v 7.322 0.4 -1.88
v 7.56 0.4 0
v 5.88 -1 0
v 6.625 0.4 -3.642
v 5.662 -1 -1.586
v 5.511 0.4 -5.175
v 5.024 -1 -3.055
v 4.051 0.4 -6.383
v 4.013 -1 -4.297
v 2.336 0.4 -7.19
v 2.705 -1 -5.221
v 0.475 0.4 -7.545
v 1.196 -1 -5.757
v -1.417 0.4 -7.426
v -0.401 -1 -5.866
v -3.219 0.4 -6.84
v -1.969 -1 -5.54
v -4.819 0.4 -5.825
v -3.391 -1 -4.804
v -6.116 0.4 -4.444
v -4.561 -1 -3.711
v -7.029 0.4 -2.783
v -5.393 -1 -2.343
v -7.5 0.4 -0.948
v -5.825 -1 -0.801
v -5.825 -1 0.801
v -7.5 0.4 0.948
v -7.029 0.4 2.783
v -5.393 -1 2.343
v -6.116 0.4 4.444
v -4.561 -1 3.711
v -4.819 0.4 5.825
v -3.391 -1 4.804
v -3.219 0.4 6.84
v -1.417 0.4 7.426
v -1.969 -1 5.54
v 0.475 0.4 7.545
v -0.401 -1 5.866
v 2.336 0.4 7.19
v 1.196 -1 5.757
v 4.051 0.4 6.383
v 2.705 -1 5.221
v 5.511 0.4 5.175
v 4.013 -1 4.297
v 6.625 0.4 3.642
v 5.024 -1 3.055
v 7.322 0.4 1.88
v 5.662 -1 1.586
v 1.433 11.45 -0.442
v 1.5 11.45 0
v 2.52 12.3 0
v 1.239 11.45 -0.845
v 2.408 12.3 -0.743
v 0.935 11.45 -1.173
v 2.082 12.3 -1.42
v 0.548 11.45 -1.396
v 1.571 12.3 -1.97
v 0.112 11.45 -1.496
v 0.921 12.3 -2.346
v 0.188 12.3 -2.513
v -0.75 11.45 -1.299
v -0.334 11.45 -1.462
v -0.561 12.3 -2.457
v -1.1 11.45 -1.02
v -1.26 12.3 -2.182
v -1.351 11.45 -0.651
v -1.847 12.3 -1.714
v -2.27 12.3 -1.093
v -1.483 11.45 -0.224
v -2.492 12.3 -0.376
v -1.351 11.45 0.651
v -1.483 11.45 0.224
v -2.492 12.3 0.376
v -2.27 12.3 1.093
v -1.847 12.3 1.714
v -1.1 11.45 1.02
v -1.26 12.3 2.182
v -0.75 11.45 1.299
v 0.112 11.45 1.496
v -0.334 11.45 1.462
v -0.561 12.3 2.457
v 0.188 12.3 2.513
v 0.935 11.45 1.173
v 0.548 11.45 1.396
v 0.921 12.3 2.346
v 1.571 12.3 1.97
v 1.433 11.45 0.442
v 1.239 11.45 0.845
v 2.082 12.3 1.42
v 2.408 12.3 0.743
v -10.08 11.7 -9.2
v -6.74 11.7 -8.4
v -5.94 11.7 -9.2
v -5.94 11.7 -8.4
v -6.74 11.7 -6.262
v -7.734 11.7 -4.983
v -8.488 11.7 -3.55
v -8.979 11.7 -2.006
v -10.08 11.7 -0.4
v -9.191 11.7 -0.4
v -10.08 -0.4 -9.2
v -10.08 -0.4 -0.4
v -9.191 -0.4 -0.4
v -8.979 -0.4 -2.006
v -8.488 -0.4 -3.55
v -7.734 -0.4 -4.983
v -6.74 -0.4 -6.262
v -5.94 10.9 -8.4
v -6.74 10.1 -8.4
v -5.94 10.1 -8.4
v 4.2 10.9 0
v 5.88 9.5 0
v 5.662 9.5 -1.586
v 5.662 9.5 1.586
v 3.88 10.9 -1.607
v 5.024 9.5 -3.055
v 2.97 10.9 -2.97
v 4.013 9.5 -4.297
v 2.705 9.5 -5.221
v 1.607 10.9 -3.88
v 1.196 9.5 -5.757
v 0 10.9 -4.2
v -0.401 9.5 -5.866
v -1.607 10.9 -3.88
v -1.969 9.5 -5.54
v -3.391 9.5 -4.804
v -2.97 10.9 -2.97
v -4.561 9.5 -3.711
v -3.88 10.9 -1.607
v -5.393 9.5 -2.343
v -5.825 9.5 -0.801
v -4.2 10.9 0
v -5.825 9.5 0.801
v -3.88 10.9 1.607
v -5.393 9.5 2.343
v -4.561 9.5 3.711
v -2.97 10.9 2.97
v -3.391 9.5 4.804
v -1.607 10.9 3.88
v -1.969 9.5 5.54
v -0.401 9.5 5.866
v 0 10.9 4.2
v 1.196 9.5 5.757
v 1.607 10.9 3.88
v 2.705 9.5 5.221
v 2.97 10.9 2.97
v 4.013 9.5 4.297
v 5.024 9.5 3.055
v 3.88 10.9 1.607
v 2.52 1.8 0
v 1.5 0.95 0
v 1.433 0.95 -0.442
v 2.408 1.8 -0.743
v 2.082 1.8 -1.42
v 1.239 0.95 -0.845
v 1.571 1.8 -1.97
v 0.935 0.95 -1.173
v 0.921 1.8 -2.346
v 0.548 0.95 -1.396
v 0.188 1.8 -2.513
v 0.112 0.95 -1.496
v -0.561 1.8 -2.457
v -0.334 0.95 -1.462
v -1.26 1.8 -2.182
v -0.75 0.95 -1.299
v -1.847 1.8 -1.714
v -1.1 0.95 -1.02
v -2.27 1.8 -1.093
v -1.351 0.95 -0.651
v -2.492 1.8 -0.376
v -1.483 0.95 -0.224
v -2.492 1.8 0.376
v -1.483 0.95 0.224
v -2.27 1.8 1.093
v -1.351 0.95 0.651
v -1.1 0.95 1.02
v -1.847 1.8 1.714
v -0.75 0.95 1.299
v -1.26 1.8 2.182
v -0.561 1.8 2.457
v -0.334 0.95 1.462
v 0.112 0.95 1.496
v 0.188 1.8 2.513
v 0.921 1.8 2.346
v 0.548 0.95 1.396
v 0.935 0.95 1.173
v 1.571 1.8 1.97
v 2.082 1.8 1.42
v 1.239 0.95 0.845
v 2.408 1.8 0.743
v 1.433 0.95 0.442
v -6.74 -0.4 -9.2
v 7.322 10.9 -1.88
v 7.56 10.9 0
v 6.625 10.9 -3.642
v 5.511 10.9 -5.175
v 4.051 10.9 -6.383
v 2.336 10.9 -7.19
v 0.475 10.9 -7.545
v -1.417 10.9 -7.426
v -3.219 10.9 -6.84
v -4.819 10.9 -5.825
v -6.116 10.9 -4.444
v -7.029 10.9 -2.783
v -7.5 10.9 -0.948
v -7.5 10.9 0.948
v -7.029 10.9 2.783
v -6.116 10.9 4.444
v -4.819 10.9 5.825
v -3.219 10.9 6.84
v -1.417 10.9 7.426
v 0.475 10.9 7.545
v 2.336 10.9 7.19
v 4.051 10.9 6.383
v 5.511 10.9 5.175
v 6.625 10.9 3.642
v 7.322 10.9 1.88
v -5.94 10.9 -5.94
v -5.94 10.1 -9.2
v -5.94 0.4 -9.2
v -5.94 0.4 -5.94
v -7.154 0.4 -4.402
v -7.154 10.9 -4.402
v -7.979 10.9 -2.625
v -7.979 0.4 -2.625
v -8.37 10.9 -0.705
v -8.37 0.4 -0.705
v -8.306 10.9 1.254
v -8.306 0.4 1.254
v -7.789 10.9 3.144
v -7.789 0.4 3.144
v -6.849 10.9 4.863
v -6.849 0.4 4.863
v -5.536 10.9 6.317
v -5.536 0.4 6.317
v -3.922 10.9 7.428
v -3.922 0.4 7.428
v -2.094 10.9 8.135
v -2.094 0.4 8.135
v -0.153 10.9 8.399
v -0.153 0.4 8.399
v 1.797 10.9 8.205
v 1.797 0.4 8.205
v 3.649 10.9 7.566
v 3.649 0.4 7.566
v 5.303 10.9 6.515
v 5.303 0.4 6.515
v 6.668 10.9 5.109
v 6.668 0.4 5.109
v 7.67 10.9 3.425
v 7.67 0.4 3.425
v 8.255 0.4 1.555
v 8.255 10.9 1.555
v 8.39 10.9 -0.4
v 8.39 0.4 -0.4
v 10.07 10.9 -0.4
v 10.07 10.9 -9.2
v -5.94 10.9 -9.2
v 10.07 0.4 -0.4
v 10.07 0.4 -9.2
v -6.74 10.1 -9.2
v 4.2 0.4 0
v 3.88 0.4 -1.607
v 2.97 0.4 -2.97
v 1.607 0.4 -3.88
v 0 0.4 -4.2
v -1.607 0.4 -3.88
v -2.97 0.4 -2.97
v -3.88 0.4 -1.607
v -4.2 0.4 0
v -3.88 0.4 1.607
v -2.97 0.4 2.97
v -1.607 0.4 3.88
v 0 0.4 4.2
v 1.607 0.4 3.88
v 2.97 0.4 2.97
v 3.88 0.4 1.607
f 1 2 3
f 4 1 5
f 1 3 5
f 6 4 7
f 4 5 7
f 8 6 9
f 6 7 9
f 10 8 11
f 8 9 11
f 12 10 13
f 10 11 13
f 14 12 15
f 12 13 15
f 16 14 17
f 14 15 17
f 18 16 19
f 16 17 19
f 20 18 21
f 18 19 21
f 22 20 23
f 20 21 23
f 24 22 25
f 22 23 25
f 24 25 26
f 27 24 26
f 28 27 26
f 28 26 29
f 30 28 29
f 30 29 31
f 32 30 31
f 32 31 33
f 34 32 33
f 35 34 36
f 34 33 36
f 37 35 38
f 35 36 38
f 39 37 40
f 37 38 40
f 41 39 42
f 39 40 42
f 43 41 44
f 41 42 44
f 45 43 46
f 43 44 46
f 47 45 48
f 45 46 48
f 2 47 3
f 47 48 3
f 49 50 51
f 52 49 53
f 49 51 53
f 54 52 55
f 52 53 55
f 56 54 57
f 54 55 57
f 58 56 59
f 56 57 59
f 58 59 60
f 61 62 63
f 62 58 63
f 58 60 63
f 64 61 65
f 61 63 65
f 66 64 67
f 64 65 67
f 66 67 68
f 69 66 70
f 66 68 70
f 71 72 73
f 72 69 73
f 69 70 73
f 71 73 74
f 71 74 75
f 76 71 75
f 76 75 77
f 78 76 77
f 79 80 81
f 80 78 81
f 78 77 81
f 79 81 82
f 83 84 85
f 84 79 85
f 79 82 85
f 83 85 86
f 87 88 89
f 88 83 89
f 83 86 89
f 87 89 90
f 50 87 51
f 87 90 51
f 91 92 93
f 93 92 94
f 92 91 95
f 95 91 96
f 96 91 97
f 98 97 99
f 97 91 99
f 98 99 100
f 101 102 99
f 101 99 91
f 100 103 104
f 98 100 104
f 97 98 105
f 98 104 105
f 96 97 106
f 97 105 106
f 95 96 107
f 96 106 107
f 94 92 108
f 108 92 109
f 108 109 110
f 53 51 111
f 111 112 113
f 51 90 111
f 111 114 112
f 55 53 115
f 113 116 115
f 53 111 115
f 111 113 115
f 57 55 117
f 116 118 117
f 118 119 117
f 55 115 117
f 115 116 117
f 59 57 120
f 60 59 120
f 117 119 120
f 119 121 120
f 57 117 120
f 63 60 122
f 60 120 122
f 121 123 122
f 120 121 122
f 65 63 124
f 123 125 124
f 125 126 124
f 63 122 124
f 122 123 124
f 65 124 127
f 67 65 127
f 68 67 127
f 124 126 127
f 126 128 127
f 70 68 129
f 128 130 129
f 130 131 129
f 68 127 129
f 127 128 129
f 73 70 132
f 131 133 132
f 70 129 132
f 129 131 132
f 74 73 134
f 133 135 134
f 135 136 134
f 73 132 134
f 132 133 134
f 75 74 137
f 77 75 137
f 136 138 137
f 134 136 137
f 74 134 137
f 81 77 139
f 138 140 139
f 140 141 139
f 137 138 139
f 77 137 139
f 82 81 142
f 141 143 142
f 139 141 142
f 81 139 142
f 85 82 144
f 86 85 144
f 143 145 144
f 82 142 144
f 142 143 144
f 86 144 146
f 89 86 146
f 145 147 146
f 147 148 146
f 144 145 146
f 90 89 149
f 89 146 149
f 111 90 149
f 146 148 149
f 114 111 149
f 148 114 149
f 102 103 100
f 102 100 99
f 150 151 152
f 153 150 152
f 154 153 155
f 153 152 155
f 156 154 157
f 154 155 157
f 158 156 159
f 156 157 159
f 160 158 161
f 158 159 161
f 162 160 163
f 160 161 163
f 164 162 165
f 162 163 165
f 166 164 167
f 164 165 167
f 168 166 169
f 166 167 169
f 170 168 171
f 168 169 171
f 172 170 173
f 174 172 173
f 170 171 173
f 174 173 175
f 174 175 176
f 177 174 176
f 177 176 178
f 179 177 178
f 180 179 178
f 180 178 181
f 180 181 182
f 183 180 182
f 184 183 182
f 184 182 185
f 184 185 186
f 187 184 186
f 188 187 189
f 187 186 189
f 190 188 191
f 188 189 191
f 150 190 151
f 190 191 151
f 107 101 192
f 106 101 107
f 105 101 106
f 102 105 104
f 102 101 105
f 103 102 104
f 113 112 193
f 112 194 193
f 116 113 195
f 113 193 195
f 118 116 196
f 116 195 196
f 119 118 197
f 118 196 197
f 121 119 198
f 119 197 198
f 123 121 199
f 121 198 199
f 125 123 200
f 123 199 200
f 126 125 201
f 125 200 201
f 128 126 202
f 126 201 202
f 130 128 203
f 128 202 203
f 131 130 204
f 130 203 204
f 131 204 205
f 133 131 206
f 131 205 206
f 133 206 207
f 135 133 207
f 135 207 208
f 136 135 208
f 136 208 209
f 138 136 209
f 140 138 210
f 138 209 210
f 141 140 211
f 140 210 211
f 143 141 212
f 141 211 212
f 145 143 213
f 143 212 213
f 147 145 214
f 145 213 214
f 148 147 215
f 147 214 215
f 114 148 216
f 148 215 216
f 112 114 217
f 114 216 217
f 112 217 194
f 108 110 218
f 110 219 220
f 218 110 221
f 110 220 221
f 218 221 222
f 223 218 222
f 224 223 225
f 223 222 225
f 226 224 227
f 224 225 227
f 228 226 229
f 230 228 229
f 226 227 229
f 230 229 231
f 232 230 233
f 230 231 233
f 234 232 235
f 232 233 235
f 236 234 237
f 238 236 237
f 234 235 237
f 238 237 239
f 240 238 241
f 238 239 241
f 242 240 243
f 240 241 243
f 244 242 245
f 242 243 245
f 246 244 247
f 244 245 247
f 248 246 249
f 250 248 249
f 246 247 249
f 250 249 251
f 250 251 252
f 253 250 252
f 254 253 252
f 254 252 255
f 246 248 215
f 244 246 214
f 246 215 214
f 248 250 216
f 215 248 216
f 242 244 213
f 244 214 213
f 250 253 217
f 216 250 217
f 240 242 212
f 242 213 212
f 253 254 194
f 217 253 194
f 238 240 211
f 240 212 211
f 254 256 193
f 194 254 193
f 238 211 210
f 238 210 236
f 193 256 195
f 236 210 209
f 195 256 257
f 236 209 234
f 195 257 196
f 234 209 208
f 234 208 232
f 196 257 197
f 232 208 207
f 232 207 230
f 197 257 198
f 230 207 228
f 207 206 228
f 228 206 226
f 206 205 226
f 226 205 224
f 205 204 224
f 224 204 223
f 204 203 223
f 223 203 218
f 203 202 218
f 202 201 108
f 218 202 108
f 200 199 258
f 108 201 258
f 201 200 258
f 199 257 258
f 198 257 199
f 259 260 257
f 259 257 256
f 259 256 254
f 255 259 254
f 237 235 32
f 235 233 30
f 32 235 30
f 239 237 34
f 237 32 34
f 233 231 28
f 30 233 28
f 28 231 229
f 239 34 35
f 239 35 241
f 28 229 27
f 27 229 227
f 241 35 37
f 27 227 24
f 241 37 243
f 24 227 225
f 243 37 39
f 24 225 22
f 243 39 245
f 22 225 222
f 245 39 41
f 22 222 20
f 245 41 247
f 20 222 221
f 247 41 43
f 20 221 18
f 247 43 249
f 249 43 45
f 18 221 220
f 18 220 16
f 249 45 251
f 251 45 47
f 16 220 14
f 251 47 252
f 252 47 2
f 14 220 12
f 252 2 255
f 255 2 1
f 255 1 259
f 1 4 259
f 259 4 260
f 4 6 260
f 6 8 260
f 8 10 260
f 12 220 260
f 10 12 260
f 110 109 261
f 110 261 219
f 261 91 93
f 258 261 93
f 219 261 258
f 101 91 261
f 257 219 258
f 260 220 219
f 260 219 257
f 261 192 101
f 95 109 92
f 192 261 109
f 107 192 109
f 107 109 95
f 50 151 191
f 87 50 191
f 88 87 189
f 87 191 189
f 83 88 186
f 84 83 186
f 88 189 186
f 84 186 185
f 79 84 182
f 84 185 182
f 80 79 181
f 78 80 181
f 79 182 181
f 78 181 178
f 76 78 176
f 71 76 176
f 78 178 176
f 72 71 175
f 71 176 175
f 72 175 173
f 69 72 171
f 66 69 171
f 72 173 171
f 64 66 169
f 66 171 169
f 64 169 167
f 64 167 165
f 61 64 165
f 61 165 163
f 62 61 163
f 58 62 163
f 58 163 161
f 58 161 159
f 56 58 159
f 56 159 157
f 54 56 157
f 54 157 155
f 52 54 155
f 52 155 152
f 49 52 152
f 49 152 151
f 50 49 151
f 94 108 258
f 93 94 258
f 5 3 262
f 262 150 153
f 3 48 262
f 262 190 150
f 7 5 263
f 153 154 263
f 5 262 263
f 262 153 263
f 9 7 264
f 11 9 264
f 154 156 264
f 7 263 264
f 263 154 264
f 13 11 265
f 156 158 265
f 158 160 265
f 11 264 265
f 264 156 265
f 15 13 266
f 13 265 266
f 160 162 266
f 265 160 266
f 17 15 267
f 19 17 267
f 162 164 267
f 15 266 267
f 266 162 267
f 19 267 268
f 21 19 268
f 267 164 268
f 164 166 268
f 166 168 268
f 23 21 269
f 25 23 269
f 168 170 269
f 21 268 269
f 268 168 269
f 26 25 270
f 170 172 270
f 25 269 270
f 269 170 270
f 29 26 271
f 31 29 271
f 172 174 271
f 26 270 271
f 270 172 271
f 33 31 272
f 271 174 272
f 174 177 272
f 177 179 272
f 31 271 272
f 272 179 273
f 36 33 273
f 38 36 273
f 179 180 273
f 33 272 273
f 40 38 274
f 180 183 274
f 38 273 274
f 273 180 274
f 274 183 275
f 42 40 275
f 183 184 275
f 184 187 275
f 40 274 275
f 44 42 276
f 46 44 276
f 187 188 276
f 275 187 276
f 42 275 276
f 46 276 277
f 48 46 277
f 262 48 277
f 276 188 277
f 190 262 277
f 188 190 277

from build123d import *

# Parameters (mm, degrees)
SKETCH013_R     = 1.5
POCKET001_DEPTH = 23.8
PAD008_DEPTH    = 10.5
PAD009_DEPTH    = 12.1
SKETCH047_W     = 0.8
SKETCH047_H     = 0.8
POCKET005_DEPTH = 10.5


with BuildPart() as part:
    # Sketch007 → Revolution (revolve)
    with BuildSketch(Plane.XY):
        Polygon((0, 10.9), (0.84, 10.9), (2.52, 12.3), (5.88, 9.5), (7.56, 10.9), (8.4, 10.9), (8.4, 0.4), (7.56, 0.4), (5.88, -1), (2.52, 1.8), (0.84, 0.4), (0, 0.4), align=None)
    revolve(axis=Axis((0, 0, 0), (0, 1, 0)))

    # Sketch013 → Pocket001 (cut)
    with BuildSketch(Plane.XZ.offset(1)):
        Circle(SKETCH013_R)
    extrude(amount=-POCKET001_DEPTH, mode=Mode.SUBTRACT)

    # Sketch023 → Pad008 (join)
    with BuildSketch(Plane.XZ.offset(-0.4)):
        with BuildLine():
            Line((-5.939697, -9.2), (10.070471, -9.2))
            Line((10.070471, -9.2), (10.070471, -0.4))
            Line((10.070471, -0.4), (8.390471, -0.4))
            ThreePointArc((-5.939697, -5.939697), (3.028801, -7.834945), (8.390471, -0.4))
            Line((-5.939697, -5.939697), (-5.939697, -9.2))
        make_face()
    extrude(amount=-PAD008_DEPTH)

    # Sketch024 → Pad009 (join)
    with BuildSketch(Plane.XZ.offset(0.4)):
        with BuildLine():
            Line((-10.08, -0.4), (-10.08, -9.2))
            Line((-10.08, -9.2), (-5.939697, -9.2))
            Line((-5.939697, -8.4), (-5.939697, -9.2))
            Line((-6.739697, -8.4), (-5.939697, -8.4))
            Line((-6.739697, -8.4), (-6.739697, -6.262307))
            ThreePointArc((-9.1913, -0.4), (-8.487687, -3.549531), (-6.739697, -6.262307))
            Line((-9.1913, -0.4), (-10.08, -0.4))
        make_face()
    extrude(amount=-PAD009_DEPTH)

    # Sketch047 → Pocket005 (cut)
    with BuildSketch(Plane.XZ.offset(0.4)):
        with Locations((-6.339697, -8.8)):
            Rectangle(SKETCH047_W, SKETCH047_H)
    extrude(amount=-POCKET005_DEPTH, mode=Mode.SUBTRACT)


solid = part.part
